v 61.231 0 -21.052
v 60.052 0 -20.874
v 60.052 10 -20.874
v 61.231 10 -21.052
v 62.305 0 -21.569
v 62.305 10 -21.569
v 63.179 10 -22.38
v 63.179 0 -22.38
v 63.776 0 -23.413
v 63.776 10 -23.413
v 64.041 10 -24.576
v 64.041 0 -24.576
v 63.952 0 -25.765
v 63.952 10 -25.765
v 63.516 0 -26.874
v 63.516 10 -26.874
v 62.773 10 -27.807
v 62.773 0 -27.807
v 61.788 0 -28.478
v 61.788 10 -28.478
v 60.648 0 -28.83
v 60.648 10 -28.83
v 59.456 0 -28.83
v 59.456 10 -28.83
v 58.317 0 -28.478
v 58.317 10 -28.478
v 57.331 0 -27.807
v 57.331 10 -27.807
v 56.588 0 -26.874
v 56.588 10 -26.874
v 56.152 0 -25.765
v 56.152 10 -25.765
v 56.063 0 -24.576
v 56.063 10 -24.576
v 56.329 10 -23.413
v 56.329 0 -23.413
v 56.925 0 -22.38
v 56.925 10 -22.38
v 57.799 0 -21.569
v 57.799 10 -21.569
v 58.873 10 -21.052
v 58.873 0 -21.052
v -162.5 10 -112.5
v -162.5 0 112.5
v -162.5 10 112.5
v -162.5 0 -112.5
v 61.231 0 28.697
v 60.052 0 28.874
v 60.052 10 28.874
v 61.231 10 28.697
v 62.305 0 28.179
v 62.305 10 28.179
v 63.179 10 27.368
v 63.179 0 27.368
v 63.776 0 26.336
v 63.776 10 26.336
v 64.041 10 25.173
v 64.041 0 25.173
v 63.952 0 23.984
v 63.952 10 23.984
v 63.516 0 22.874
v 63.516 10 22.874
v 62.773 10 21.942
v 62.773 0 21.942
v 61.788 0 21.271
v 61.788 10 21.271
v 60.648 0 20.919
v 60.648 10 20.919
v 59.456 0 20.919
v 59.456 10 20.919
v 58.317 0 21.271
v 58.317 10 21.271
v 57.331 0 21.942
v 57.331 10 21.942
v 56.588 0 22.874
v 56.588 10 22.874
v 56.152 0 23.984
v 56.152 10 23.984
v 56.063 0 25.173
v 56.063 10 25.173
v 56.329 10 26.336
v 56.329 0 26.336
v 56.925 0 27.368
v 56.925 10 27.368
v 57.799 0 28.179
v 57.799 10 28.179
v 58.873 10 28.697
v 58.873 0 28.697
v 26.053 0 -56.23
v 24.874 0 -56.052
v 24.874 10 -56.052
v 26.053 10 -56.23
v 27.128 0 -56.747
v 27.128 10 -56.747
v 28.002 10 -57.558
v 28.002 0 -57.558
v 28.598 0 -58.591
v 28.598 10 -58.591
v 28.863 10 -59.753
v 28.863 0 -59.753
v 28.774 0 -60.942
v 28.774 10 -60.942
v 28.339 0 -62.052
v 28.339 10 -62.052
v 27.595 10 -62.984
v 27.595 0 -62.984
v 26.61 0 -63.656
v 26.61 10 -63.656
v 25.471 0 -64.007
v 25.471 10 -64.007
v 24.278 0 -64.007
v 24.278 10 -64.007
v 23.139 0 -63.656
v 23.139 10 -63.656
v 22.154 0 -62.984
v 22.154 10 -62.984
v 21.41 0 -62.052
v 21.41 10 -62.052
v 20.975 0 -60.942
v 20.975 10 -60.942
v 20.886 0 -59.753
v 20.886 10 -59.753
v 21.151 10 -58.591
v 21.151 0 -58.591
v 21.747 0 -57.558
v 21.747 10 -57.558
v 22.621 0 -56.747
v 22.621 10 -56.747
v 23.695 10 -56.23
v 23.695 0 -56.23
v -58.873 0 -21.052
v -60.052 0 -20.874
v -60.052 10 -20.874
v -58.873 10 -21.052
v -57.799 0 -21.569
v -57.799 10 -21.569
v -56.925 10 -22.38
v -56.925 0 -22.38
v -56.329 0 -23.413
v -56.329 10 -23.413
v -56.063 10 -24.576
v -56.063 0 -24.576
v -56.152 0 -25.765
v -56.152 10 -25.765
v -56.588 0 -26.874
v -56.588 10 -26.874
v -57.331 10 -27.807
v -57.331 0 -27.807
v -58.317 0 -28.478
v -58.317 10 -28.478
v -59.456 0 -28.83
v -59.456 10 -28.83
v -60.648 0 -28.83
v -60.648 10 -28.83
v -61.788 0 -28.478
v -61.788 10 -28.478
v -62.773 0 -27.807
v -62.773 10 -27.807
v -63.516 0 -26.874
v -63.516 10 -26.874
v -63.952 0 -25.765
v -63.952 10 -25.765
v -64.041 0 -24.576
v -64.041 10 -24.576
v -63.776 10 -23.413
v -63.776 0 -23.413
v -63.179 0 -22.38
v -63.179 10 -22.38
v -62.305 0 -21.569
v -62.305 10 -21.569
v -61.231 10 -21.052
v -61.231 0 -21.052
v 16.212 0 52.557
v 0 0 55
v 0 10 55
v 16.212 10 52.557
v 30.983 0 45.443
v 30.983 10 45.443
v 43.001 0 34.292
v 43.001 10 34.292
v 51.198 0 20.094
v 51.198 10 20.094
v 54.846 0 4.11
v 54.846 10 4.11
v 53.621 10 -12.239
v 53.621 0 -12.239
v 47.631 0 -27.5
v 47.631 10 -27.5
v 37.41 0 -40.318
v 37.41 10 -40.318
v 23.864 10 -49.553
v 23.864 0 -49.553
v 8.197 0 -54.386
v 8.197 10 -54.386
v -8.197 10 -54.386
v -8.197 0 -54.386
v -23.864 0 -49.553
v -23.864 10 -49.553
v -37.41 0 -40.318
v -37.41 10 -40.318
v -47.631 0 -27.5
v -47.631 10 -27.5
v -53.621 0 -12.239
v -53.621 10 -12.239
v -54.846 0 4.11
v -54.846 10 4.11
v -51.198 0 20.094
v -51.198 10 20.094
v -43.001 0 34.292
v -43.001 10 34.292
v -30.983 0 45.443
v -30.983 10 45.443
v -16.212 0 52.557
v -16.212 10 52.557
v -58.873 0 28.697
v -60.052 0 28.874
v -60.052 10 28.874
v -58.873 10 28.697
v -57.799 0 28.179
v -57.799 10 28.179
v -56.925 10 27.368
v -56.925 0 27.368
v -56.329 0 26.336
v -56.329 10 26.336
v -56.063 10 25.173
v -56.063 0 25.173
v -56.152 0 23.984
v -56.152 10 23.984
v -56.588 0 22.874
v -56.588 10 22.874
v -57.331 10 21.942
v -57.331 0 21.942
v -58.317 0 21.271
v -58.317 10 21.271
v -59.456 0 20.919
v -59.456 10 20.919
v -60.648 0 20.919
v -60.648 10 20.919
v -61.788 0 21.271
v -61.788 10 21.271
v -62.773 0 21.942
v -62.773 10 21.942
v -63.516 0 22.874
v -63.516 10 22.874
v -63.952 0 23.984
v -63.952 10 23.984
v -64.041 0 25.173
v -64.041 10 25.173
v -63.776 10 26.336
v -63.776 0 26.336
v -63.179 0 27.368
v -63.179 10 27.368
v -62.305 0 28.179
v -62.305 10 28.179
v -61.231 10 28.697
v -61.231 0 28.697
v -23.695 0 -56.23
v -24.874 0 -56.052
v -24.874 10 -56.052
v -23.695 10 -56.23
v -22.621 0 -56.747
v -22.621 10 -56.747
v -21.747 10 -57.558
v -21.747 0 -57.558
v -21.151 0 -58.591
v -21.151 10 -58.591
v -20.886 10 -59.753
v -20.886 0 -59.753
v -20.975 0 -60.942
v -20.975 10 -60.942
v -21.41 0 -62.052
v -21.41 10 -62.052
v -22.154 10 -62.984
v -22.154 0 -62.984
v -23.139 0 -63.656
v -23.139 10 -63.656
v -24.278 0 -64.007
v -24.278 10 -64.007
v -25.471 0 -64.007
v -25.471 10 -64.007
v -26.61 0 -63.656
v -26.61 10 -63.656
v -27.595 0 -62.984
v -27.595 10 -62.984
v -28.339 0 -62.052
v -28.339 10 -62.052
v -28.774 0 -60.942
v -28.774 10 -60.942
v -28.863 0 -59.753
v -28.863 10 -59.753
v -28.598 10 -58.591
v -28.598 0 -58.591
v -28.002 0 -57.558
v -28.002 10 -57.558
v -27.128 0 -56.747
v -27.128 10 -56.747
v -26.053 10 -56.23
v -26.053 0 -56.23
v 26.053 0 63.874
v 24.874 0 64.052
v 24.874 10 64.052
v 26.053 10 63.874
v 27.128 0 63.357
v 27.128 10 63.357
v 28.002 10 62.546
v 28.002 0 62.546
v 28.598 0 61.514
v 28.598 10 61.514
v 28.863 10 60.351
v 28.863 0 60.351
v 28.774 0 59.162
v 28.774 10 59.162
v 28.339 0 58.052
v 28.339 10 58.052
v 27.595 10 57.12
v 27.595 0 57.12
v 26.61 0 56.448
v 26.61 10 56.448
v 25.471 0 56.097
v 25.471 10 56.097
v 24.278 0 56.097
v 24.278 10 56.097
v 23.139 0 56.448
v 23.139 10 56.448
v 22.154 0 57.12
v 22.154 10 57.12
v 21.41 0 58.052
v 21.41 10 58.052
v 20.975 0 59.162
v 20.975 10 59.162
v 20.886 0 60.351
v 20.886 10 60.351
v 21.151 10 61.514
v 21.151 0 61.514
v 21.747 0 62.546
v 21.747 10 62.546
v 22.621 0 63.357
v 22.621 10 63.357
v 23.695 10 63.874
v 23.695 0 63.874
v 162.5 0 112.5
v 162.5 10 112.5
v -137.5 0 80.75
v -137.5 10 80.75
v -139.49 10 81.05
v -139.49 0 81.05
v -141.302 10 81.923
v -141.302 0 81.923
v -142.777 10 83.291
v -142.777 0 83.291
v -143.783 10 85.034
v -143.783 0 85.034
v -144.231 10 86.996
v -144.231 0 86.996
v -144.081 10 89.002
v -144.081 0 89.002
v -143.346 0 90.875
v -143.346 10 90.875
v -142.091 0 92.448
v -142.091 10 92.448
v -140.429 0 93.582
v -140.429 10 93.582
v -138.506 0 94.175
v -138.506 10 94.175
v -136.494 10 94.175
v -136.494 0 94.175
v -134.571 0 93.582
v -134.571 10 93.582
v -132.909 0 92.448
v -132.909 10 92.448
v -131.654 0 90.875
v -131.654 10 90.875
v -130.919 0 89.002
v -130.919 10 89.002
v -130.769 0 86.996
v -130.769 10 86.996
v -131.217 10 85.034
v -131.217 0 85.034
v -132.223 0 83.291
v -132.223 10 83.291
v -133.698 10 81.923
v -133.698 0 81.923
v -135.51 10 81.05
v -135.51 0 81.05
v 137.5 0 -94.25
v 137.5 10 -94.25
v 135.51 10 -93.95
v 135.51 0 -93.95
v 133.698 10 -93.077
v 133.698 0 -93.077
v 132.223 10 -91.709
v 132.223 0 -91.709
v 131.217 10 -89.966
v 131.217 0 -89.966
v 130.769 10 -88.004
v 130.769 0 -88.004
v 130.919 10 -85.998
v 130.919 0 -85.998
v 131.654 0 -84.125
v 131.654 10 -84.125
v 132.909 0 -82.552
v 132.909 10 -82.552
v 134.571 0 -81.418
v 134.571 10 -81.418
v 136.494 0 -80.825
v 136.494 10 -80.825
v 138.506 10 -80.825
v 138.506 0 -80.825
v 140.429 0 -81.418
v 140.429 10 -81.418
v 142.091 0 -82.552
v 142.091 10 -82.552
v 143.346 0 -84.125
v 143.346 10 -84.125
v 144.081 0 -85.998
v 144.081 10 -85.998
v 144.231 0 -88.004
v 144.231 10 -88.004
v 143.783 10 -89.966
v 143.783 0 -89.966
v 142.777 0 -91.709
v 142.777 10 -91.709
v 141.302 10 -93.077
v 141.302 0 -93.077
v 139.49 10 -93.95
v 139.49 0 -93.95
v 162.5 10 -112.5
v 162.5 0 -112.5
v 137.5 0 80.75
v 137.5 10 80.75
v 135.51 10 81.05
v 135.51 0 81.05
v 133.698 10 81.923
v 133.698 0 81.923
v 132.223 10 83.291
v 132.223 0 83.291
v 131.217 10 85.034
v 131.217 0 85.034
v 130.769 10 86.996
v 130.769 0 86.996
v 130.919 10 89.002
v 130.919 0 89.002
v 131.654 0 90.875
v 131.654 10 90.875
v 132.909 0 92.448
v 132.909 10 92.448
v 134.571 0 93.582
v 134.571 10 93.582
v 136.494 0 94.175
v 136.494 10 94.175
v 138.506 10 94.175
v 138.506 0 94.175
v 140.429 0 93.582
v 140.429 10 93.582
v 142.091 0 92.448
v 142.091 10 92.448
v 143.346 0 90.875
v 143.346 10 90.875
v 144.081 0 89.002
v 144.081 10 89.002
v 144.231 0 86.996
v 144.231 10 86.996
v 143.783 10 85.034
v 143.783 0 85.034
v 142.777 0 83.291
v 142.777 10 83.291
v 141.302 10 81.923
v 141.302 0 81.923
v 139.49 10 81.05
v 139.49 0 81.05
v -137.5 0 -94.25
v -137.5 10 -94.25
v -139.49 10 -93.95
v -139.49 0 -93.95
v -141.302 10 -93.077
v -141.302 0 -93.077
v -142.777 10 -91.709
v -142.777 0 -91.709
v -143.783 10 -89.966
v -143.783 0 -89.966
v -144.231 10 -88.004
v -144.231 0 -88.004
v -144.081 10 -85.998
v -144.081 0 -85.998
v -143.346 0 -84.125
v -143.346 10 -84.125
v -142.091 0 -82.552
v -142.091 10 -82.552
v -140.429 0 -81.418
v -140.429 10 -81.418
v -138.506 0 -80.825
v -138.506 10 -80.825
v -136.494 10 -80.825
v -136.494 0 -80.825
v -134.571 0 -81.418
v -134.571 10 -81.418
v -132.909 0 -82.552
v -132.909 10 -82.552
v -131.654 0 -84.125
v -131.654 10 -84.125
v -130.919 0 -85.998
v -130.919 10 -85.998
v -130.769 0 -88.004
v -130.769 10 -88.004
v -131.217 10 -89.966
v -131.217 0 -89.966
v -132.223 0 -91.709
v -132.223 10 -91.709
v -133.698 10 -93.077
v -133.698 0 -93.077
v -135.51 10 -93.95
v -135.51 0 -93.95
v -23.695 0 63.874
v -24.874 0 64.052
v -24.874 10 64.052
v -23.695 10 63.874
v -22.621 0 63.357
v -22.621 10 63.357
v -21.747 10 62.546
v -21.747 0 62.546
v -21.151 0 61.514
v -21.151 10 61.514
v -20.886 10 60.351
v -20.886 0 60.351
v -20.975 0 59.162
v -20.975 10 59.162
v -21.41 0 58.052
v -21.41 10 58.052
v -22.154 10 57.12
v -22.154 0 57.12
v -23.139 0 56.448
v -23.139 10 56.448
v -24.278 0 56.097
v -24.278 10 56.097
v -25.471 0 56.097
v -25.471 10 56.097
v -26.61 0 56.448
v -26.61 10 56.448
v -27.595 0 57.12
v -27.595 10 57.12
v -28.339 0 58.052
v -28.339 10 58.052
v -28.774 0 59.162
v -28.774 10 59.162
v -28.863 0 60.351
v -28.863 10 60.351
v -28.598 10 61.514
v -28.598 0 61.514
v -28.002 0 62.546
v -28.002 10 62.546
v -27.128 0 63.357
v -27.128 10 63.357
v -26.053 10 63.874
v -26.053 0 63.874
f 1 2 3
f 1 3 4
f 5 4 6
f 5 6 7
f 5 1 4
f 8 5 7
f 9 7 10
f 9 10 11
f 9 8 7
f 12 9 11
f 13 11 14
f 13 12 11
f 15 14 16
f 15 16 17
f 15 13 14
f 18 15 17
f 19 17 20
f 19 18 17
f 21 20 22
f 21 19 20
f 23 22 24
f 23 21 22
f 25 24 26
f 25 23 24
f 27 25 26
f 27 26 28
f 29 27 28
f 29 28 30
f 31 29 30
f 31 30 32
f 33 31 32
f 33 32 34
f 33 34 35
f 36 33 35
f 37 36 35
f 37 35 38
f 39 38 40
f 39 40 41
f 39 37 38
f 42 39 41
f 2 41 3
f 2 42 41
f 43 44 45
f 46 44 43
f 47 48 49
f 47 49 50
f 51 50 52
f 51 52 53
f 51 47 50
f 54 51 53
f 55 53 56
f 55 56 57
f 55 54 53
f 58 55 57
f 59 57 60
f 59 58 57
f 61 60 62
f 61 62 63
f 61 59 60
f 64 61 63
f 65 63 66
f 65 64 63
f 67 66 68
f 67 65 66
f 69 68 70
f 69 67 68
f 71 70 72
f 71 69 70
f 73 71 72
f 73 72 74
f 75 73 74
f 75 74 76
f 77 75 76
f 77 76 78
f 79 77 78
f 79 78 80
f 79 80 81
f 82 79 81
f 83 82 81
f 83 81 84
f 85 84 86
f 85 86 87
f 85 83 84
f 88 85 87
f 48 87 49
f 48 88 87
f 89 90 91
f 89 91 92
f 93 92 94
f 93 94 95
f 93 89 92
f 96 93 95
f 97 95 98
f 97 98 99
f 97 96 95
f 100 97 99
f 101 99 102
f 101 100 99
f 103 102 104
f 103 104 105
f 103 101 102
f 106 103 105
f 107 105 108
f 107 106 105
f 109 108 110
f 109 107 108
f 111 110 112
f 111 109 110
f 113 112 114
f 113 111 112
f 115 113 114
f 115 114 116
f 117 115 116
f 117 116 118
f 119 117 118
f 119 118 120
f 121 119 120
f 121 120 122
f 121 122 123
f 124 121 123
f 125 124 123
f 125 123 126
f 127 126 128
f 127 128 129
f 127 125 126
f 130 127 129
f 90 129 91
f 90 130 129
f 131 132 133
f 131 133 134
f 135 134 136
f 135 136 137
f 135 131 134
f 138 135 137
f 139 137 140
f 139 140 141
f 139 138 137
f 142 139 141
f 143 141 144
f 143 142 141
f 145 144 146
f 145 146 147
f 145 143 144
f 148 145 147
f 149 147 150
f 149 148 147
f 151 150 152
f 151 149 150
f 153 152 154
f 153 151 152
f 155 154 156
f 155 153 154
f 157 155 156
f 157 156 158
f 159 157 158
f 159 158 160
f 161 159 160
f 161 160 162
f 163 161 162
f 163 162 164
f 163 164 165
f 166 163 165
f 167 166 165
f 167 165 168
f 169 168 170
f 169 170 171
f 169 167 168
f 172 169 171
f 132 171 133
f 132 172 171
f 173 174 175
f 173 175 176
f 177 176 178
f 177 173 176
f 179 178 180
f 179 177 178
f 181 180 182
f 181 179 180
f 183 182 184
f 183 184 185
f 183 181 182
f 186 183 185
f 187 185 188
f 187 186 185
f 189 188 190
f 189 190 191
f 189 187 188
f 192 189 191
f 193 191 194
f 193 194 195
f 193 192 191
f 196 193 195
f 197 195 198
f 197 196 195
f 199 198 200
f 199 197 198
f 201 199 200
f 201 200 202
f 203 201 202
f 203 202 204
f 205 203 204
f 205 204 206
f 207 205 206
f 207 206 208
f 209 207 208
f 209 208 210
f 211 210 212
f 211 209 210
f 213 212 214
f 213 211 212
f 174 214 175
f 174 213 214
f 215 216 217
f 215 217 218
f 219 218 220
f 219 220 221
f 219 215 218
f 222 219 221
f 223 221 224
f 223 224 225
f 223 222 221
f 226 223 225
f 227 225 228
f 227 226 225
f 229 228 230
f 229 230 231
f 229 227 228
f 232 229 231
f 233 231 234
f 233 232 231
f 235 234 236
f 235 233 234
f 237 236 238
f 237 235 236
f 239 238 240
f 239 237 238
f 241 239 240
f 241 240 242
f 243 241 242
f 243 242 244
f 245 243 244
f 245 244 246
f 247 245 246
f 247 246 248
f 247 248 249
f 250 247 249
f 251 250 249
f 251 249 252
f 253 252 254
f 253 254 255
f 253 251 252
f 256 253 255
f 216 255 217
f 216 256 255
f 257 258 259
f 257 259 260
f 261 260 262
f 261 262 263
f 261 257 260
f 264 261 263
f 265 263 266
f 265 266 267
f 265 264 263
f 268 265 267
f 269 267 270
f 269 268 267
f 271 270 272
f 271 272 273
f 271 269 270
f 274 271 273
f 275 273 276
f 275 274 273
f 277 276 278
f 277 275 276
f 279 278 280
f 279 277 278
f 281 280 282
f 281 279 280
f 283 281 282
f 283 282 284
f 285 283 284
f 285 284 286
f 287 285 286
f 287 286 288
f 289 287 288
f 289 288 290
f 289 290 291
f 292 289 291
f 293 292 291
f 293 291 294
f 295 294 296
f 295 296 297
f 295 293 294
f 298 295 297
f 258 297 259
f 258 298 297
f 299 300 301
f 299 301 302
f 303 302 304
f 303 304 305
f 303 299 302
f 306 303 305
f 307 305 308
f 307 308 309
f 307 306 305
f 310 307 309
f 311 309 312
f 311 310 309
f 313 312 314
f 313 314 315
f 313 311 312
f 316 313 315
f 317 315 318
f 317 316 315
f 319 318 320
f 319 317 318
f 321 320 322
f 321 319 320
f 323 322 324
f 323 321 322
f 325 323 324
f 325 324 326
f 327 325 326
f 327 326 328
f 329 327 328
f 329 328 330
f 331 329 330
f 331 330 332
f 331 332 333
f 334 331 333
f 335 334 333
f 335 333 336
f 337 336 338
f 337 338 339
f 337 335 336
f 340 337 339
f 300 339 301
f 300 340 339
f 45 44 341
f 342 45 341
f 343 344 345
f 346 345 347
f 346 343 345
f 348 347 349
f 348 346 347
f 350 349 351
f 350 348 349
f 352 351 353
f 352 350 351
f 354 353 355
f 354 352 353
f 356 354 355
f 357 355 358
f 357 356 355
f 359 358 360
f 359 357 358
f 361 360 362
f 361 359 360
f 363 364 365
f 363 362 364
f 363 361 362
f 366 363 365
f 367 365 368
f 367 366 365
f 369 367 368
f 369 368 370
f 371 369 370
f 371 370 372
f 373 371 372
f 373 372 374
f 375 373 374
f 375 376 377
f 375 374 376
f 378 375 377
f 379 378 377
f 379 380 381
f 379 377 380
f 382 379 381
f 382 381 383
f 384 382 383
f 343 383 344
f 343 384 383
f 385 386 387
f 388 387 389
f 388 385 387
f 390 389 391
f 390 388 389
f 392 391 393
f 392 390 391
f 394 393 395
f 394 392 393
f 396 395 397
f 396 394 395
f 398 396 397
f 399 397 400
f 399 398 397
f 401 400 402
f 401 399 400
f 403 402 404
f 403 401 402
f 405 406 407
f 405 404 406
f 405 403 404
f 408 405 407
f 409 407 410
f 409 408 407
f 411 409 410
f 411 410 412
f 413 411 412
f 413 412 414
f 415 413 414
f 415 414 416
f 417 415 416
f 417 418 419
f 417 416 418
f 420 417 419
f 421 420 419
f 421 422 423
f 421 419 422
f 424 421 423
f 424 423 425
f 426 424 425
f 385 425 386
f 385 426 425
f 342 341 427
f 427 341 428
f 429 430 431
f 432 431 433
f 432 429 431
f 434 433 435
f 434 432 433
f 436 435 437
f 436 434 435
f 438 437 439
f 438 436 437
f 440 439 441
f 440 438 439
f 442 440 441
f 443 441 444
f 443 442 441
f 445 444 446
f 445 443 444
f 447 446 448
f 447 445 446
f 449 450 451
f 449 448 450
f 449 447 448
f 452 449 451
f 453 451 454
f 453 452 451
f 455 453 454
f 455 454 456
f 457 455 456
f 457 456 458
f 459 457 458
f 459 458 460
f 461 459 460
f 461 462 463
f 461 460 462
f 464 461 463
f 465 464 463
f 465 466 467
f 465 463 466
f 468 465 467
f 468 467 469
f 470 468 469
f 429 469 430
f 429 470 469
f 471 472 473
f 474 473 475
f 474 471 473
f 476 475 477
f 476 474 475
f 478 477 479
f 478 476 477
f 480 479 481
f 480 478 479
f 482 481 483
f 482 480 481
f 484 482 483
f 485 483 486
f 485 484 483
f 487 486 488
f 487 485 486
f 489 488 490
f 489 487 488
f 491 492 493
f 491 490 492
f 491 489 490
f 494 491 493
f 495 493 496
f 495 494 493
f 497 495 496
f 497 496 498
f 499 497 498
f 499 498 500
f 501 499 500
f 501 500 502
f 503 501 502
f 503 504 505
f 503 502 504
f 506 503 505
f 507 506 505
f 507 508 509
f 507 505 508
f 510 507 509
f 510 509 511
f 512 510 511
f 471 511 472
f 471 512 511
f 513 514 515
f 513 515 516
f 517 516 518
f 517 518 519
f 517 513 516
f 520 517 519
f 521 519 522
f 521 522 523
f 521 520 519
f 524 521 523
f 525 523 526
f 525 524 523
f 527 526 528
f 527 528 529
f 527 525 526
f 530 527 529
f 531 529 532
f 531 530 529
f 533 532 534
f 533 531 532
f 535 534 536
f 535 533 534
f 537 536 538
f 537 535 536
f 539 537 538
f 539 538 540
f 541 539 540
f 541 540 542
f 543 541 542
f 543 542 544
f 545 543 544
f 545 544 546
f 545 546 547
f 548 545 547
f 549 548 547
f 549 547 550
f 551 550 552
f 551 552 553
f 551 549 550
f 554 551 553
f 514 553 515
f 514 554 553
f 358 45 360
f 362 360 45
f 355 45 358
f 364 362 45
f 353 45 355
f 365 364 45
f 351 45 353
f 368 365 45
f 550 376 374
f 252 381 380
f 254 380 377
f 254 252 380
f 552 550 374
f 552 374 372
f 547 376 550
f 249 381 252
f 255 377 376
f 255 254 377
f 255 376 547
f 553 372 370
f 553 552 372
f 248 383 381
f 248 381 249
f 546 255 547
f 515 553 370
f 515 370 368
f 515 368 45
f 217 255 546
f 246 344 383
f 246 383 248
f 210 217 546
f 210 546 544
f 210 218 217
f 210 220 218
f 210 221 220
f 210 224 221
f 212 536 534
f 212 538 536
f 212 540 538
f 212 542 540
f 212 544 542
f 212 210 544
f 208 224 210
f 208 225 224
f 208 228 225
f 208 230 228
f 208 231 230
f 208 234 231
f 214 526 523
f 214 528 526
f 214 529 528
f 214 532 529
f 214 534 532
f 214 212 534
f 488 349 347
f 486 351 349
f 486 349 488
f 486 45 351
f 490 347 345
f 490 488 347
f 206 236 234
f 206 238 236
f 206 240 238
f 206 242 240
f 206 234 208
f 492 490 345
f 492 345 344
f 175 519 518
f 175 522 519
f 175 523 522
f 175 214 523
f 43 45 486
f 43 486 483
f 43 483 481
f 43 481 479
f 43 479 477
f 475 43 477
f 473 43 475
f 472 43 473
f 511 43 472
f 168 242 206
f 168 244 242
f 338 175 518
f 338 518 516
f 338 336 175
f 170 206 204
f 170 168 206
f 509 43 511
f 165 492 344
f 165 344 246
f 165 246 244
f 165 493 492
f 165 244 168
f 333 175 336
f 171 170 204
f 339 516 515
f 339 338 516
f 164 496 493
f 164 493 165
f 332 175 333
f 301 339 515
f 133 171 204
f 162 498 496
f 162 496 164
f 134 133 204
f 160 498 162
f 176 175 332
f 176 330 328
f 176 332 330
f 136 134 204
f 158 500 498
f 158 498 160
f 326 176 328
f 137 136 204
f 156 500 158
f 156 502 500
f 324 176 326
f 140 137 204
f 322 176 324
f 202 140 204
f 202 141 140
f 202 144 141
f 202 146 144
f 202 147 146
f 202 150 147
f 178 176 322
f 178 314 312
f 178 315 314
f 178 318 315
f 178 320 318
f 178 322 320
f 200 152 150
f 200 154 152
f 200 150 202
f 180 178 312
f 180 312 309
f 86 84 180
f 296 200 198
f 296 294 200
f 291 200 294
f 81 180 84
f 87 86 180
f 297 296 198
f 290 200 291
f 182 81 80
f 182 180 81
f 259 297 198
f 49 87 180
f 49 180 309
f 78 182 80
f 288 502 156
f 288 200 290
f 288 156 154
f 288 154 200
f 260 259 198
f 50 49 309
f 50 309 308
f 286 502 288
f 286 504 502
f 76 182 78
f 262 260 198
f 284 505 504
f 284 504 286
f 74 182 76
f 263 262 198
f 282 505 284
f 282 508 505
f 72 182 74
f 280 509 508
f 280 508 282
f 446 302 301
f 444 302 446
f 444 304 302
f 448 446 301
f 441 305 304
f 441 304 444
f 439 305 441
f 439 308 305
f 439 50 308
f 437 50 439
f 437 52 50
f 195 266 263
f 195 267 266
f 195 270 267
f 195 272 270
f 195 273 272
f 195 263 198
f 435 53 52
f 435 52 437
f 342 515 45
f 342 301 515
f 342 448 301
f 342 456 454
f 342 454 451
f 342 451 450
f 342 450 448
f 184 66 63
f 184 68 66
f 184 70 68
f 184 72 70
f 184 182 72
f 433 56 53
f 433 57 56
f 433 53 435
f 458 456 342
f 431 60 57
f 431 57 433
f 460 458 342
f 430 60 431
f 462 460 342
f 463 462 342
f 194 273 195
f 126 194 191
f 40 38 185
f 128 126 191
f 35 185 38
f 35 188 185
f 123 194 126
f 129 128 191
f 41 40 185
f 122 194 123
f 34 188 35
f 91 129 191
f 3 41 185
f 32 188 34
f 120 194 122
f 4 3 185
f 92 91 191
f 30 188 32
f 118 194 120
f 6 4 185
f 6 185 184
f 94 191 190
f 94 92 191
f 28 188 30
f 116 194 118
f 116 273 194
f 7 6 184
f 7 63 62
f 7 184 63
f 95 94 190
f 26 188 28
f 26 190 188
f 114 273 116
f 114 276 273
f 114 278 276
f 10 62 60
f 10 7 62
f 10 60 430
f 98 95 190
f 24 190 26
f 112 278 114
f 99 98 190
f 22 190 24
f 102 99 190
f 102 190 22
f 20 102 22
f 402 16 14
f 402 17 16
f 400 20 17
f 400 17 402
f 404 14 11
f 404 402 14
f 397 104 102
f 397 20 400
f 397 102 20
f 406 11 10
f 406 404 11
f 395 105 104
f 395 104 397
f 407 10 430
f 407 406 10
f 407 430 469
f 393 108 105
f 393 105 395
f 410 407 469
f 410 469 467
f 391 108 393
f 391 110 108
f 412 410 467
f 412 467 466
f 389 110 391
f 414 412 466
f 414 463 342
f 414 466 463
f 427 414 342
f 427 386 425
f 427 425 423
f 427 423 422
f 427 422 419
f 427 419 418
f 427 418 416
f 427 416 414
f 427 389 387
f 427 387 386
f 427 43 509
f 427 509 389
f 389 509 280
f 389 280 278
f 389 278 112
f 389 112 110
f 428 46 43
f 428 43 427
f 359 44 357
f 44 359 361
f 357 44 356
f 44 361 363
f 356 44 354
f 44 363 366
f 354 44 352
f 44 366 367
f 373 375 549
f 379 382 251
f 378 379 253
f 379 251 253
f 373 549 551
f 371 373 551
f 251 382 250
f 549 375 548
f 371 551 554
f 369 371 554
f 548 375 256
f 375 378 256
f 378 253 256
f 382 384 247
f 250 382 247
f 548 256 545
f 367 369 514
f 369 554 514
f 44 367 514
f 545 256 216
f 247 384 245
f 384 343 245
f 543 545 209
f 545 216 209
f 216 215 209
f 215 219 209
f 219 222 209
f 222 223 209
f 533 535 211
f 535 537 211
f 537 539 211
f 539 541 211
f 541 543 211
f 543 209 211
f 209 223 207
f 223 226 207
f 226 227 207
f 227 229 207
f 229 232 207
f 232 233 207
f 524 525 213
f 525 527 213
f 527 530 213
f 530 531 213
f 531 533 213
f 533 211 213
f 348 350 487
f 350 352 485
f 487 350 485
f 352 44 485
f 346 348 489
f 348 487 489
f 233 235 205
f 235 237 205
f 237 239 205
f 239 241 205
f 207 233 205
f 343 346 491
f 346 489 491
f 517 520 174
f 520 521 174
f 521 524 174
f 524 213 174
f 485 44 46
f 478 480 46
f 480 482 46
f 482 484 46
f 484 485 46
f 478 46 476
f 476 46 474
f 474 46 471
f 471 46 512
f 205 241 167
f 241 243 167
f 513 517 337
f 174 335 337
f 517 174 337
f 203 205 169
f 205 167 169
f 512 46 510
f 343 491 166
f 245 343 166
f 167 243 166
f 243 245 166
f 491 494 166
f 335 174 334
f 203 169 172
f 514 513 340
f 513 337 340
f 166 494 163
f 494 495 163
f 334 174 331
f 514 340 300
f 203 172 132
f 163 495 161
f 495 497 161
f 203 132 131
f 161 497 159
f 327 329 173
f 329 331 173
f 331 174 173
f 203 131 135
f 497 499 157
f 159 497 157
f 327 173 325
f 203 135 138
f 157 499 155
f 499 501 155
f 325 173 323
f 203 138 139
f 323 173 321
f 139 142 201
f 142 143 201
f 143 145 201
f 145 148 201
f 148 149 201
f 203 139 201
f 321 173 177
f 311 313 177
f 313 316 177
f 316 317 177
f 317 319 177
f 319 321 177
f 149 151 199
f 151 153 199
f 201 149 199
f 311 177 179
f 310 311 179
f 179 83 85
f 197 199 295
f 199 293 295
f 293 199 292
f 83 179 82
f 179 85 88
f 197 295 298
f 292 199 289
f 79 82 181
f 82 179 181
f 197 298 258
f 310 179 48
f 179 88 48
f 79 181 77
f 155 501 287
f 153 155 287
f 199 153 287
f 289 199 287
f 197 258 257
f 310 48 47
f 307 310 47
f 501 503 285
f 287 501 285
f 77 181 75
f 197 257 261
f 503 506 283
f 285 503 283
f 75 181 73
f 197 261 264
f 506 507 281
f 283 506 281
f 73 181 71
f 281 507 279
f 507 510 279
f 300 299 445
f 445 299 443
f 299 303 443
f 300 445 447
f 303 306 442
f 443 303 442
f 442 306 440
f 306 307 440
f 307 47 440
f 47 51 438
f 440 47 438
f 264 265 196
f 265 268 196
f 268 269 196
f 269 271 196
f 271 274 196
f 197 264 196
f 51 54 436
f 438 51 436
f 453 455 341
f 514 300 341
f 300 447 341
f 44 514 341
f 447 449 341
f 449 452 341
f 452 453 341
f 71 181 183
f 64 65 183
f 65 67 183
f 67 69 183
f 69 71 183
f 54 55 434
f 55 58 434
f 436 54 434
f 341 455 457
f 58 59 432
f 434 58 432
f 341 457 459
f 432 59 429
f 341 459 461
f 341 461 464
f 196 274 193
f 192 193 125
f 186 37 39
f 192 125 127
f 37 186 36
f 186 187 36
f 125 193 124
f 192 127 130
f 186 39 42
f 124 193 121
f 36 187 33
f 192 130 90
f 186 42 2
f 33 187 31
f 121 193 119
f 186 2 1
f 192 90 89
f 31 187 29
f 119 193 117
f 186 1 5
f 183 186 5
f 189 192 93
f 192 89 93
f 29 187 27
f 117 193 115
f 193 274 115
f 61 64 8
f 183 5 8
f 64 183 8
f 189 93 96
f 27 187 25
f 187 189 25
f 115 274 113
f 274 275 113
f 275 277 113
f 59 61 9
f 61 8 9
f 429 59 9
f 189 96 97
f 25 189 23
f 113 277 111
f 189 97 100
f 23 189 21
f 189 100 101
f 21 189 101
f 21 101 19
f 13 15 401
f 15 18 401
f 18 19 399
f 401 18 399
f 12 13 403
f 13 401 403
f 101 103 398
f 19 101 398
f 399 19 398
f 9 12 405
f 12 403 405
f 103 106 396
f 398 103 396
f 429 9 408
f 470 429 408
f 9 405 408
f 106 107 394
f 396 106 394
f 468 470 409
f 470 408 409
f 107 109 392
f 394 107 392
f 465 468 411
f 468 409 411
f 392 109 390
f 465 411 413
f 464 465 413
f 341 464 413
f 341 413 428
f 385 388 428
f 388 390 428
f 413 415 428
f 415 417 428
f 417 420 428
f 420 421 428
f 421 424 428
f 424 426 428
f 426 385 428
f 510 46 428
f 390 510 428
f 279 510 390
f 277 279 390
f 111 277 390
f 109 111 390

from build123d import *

# Parameters (mm, degrees)
SKETCH1_W           = 325
SKETCH1_H           = 225
SKETCH1_R           = 55
BOSS_EXTRUDE1_DEPTH = 10
SKETCH2_R           = 4
CUT_EXTRUDE1_DEPTH  = 10
CUT_EXTRUDE2_REACH  = 199.895
SKETCH4_R           = 6.75


with BuildPart() as part:
    # Sketch1 → Boss-Extrude1 (new body)
    with BuildSketch(Plane(origin=(0, 0, 0), x_dir=(1, 0, 0), z_dir=(0, 1, 0))):
        Rectangle(SKETCH1_W, SKETCH1_H)
        with Locations(Location((0, 0, 0), (0, 0, 270))):
            Circle(SKETCH1_R, mode=Mode.SUBTRACT)
    extrude(amount=BOSS_EXTRUDE1_DEPTH)

    # Sketch2 → Cut-Extrude1 (cut)
    with BuildSketch(Plane(origin=(0, 0, 0), x_dir=(1, 0, 0), z_dir=(0, 1, 0))):
        with Locations(Location((-24.874423104, -60.052169613, 0), (0, 0, 270))):
            Circle(SKETCH2_R)
        with Locations(Location((-60.052169613, -24.874423104, 0), (0, 0, 270))):
            Circle(SKETCH2_R)
        with Locations(Location((-60.052169613, 24.874423104, 0), (0, 0, 270))):
            Circle(SKETCH2_R)
        with Locations(Location((-24.874423104, 60.052169613, 0), (0, 0, 270))):
            Circle(SKETCH2_R)
        with Locations(Location((24.874423104, 60.052169613, 0), (0, 0, 270))):
            Circle(SKETCH2_R)
        with Locations(Location((60.052169613, 24.874423104, 0), (0, 0, 270))):
            Circle(SKETCH2_R)
        with Locations(Location((60.052169613, -24.874423104, 0), (0, 0, 270))):
            Circle(SKETCH2_R)
        with Locations(Location((24.874423104, -60.052169613, 0), (0, 0, 270))):
            Circle(SKETCH2_R)
    extrude(amount=CUT_EXTRUDE1_DEPTH, mode=Mode.SUBTRACT)

    # Sketch4 → Cut-Extrude2 (cut, up to next)
    with BuildSketch(Plane(origin=(0, 0, 0), x_dir=(1, 0, 0), z_dir=(0, 1, 0)), mode=Mode.PRIVATE) as cut_extrude2_sk1:
        with Locations(Location((137.5, 87.5, 0), (0, 0, 90))):
            Circle(SKETCH4_R)
    cut_extrude2_tool1 = extrude(cut_extrude2_sk1.sketch, amount=CUT_EXTRUDE2_REACH, mode=Mode.PRIVATE) & part.part
    # Sketch4 → Cut-Extrude2 (cut, up to next)
    with BuildSketch(Plane(origin=(0, 0, 0), x_dir=(1, 0, 0), z_dir=(0, 1, 0)), mode=Mode.PRIVATE) as cut_extrude2_sk2:
        with Locations(Location((-137.5, 87.5, 0), (0, 0, 90))):
            Circle(SKETCH4_R)
    cut_extrude2_tool2 = extrude(cut_extrude2_sk2.sketch, amount=CUT_EXTRUDE2_REACH, mode=Mode.PRIVATE) & part.part
    # Sketch4 → Cut-Extrude2 (cut, up to next)
    with BuildSketch(Plane(origin=(0, 0, 0), x_dir=(1, 0, 0), z_dir=(0, 1, 0)), mode=Mode.PRIVATE) as cut_extrude2_sk3:
        with Locations(Location((-137.5, -87.5, 0), (0, 0, 90))):
            Circle(SKETCH4_R)
    cut_extrude2_tool3 = extrude(cut_extrude2_sk3.sketch, amount=CUT_EXTRUDE2_REACH, mode=Mode.PRIVATE) & part.part
    # Sketch4 → Cut-Extrude2 (cut, up to next)
    with BuildSketch(Plane(origin=(0, 0, 0), x_dir=(1, 0, 0), z_dir=(0, 1, 0)), mode=Mode.PRIVATE) as cut_extrude2_sk4:
        with Locations(Location((137.5, -87.5, 0), (0, 0, 90))):
            Circle(SKETCH4_R)
    cut_extrude2_tool4 = extrude(cut_extrude2_sk4.sketch, amount=CUT_EXTRUDE2_REACH, mode=Mode.PRIVATE) & part.part
    add(cut_extrude2_tool1.solids().sort_by_distance((137.5, 0, -87.5))[0], mode=Mode.SUBTRACT)
    add(cut_extrude2_tool2.solids().sort_by_distance((-137.5, 0, -87.5))[0], mode=Mode.SUBTRACT)
    add(cut_extrude2_tool3.solids().sort_by_distance((-137.5, 0, 87.5))[0], mode=Mode.SUBTRACT)
    add(cut_extrude2_tool4.solids().sort_by_distance((137.5, 0, 87.5))[0], mode=Mode.SUBTRACT)


solid = part.part
